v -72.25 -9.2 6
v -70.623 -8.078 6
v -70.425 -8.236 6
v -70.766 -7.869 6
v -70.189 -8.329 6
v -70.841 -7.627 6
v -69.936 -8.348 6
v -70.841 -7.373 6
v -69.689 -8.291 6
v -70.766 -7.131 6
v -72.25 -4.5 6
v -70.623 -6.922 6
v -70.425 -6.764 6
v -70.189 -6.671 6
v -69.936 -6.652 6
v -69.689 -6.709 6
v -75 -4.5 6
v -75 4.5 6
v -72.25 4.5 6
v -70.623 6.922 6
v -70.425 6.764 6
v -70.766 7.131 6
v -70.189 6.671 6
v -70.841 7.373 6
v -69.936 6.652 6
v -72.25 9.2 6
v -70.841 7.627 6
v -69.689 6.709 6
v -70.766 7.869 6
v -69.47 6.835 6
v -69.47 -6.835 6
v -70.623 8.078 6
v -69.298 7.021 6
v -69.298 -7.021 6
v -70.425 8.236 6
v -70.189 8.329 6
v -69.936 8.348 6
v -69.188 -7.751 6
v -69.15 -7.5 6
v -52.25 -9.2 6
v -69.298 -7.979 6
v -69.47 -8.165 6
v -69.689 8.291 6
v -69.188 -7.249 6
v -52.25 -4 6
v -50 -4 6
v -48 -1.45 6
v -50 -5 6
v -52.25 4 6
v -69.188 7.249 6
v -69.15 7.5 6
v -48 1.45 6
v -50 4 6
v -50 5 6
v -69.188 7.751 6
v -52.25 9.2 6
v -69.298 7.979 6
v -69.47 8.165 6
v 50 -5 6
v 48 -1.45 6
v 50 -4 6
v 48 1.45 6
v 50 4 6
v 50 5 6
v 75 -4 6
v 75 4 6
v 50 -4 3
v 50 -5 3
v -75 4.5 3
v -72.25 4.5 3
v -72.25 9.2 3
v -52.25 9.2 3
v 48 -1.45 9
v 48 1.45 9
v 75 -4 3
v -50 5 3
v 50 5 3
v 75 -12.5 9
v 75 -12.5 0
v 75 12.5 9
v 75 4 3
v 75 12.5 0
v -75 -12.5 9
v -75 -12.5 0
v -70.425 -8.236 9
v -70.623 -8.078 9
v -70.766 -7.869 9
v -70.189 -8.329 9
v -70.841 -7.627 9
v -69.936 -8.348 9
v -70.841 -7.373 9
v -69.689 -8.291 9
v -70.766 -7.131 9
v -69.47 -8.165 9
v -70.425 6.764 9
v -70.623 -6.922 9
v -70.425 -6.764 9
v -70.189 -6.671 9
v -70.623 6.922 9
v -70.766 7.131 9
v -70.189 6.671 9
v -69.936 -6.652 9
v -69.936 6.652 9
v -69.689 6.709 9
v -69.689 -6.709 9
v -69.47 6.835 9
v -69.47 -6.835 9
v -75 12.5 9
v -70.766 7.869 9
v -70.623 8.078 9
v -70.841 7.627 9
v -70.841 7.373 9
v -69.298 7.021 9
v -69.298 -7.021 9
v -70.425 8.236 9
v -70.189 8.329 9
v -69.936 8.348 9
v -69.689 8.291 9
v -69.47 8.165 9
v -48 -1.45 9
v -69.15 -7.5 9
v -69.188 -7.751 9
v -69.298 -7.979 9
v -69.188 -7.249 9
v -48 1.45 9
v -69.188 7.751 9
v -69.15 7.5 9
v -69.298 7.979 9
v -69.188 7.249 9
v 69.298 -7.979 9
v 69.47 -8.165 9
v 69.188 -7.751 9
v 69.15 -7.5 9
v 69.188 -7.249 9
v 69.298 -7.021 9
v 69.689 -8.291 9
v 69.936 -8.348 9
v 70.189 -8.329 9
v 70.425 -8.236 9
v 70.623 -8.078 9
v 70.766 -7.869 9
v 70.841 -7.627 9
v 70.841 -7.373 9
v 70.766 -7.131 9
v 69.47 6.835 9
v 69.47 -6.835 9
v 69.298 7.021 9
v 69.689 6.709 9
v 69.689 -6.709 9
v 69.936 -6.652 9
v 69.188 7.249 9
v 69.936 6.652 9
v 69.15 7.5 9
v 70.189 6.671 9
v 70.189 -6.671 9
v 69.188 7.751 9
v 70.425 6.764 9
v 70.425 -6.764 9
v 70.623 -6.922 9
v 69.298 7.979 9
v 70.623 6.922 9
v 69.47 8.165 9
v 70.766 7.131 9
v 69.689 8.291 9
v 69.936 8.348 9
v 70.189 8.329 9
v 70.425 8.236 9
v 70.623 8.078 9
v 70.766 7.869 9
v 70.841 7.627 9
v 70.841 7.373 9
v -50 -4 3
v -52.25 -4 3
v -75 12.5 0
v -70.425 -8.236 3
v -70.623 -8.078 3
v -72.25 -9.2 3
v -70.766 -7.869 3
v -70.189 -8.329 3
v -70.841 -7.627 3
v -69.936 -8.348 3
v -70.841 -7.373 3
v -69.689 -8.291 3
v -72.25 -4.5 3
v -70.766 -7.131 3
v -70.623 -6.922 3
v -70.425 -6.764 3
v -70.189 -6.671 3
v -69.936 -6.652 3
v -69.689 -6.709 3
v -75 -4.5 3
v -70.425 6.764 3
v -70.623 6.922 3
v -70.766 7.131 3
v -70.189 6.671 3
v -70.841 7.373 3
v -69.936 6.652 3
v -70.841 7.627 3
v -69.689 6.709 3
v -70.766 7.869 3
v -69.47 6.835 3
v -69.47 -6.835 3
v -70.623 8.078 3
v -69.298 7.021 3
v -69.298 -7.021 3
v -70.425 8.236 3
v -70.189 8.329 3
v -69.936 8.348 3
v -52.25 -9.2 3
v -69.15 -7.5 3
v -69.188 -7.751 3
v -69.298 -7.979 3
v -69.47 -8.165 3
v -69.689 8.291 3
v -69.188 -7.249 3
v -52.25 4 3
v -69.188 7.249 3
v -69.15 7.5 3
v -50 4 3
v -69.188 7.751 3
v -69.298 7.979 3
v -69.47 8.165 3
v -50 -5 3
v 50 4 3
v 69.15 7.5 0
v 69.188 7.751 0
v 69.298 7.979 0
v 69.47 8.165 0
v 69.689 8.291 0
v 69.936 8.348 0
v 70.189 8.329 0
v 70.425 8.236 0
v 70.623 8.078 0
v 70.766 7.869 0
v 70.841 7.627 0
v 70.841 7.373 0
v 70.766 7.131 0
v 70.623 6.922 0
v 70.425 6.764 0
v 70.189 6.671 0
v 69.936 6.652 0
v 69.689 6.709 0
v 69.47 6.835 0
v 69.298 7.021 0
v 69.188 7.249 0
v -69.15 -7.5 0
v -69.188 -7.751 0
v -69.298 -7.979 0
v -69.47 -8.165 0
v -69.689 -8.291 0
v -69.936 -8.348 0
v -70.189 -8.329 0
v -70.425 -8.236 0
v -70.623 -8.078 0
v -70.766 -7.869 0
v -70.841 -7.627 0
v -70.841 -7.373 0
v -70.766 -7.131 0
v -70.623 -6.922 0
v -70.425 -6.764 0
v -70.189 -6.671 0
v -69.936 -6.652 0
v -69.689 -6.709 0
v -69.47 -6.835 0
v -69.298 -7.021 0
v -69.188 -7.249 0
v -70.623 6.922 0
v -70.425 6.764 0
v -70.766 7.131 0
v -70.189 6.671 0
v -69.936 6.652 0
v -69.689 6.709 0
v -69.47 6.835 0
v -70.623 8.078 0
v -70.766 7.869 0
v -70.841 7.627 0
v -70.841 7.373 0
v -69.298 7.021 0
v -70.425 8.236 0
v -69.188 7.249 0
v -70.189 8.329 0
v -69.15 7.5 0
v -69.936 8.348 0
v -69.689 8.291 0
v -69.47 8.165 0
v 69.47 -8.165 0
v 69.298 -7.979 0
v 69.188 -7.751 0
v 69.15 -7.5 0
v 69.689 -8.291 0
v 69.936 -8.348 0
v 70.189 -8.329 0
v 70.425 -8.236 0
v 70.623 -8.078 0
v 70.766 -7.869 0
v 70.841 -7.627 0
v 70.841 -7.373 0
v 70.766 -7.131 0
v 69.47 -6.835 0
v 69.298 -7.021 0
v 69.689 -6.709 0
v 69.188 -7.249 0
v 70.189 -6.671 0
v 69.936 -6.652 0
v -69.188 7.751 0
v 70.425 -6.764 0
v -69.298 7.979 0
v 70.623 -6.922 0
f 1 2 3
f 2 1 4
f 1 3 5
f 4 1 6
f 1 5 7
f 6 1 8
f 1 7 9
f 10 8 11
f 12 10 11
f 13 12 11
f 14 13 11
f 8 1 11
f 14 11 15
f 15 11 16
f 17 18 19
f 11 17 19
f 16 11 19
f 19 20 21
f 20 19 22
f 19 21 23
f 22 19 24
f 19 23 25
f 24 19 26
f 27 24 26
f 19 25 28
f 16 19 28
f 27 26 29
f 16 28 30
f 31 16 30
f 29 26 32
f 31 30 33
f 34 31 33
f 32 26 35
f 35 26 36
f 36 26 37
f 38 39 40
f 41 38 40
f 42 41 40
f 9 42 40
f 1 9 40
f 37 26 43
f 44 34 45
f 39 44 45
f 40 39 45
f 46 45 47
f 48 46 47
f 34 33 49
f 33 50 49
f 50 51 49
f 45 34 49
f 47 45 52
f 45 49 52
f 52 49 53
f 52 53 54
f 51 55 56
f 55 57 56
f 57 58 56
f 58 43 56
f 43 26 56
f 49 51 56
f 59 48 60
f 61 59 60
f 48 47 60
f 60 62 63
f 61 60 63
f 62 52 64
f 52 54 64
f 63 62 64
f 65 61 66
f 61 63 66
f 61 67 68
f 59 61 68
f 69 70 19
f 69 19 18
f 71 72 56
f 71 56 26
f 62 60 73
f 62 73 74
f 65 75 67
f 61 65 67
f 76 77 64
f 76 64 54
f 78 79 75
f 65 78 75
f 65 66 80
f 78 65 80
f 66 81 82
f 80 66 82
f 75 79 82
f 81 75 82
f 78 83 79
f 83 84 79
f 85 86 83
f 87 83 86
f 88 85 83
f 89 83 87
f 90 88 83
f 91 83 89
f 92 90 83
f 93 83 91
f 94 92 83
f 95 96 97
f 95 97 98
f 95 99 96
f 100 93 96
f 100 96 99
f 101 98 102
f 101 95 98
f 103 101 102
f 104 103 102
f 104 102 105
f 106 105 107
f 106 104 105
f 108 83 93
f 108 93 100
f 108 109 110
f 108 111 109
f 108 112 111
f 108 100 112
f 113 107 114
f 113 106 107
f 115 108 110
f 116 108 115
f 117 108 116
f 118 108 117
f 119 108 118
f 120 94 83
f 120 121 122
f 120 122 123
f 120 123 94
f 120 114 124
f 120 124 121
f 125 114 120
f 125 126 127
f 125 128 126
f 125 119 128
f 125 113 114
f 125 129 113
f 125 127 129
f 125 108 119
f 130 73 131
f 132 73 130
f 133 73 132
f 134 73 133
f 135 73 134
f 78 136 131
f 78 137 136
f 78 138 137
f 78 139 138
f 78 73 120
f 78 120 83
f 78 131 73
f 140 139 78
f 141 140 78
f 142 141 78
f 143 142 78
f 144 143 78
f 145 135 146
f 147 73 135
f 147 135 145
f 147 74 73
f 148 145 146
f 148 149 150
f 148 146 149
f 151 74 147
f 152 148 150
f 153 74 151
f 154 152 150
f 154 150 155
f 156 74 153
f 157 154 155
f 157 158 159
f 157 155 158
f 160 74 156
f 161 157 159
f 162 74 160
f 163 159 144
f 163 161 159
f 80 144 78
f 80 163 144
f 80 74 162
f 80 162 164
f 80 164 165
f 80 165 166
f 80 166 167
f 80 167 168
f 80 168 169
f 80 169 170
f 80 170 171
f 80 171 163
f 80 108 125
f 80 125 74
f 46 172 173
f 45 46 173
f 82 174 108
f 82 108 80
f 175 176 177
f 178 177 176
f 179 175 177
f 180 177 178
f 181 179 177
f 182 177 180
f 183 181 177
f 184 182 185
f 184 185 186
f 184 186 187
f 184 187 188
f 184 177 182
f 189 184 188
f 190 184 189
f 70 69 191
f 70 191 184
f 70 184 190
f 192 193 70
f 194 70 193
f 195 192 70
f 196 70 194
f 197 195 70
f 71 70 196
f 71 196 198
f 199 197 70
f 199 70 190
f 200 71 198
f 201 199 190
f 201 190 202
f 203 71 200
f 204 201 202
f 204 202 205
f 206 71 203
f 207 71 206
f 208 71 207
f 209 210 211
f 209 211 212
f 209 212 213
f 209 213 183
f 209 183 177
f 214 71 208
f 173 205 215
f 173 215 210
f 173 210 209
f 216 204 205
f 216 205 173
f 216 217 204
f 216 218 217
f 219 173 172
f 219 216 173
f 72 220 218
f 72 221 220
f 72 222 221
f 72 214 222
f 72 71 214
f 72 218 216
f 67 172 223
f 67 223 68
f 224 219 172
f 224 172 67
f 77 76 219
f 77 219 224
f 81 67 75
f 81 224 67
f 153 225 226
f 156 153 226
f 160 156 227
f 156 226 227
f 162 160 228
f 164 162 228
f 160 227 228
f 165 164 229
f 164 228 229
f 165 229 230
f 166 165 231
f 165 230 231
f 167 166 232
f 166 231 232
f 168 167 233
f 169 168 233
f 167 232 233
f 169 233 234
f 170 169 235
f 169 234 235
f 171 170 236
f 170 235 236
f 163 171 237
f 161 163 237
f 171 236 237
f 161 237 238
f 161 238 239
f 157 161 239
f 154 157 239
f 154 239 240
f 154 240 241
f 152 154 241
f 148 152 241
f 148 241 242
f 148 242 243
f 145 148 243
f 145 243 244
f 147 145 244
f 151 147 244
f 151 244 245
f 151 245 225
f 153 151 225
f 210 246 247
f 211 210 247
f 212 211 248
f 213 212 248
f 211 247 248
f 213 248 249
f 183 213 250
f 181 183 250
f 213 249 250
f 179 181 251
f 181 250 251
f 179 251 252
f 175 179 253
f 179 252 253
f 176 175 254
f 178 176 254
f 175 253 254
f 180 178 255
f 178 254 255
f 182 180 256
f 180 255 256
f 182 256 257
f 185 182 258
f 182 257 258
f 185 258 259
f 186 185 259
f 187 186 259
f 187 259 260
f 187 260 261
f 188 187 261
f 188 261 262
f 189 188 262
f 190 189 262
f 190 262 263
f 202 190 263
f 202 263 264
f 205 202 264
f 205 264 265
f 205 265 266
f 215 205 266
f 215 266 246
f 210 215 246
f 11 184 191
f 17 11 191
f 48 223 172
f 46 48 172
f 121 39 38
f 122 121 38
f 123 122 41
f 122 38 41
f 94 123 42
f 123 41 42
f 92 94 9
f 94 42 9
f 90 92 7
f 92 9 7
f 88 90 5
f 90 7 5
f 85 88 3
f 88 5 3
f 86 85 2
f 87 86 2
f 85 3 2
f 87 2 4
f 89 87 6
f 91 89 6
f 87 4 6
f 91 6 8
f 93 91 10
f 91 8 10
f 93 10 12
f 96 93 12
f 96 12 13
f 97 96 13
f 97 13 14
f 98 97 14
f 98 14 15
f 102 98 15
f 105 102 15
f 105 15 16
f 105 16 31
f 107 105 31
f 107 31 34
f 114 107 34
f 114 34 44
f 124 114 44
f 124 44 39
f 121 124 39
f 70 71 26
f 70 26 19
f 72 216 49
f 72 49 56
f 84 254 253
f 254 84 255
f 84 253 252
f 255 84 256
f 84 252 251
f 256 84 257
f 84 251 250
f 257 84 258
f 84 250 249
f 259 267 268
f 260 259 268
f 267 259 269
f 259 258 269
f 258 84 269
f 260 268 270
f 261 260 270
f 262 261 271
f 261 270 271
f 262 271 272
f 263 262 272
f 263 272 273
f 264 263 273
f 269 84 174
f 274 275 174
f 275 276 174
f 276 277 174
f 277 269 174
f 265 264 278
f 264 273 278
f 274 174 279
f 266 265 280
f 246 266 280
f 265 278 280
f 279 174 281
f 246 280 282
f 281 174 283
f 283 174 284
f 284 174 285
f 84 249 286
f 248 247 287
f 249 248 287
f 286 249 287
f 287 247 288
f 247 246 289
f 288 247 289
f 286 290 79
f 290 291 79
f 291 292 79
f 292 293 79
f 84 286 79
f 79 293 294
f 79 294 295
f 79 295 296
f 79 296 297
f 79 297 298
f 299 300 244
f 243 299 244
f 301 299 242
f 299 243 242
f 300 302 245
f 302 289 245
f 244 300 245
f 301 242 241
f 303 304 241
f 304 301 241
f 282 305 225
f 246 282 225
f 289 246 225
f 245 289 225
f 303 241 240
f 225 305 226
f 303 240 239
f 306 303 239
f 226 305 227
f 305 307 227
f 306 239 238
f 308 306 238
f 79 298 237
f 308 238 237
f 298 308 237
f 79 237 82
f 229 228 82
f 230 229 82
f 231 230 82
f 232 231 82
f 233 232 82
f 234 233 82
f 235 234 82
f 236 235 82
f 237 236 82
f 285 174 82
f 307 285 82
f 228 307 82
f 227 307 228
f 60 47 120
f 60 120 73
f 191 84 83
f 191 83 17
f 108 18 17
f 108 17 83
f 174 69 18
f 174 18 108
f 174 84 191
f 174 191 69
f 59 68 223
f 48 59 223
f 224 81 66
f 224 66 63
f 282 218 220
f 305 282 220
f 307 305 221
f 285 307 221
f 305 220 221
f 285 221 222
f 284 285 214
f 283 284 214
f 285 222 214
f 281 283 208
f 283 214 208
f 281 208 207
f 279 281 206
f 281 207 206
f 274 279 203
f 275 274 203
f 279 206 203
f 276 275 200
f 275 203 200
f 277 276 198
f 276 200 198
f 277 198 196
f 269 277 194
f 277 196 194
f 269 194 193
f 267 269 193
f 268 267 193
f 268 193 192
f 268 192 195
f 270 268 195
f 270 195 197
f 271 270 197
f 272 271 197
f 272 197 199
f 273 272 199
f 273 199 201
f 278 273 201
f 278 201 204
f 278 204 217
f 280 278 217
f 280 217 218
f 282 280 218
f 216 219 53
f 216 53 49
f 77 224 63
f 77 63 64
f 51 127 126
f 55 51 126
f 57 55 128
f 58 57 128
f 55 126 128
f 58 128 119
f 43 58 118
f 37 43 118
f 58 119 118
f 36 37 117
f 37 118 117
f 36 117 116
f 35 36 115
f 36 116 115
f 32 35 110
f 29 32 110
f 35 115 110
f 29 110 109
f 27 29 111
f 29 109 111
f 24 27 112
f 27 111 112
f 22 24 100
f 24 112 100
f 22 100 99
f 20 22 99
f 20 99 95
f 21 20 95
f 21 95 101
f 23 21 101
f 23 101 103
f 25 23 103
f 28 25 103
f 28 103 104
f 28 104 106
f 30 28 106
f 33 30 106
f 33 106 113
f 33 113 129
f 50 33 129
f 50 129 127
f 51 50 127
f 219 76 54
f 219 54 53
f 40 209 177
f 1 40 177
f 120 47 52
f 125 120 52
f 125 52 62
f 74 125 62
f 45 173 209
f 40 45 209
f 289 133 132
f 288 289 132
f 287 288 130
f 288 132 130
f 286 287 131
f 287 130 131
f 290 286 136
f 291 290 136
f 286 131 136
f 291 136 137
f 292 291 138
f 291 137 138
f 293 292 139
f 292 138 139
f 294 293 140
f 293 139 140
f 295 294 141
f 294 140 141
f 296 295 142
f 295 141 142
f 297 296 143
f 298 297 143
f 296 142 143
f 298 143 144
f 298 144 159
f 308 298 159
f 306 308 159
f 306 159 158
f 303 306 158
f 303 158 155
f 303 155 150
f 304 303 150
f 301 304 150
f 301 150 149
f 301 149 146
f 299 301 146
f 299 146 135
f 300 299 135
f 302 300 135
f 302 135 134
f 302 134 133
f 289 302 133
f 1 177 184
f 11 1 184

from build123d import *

# Parameters (mm, degrees)
SKETCH_W              = 150
SKETCH_H              = 25
PAD_DEPTH             = 3
PAD001_DEPTH          = 3
SKETCH004_W           = 150
SKETCH004_H           = 25
SKETCH004_W_2         = 96
SKETCH004_H_2         = 2.9
PAD002_DEPTH          = 3
SKETCH005_R           = 0.85
POCKET_DEPTH          = 313.671314
POLARPATTERN_COUNT    = 2
POLARPATTERN001_COUNT = 2
POLARPATTERN002_COUNT = 2


with BuildPart() as part:
    # Sketch → Pad (new body)
    with BuildSketch(Plane.XY):
        Rectangle(SKETCH_W, SKETCH_H)
    extrude(amount=PAD_DEPTH)

    # Sketch001 (on Face6 of Pad) → Pad001 (join)
    with BuildSketch(Plane.XY.offset(3)):
        Polygon((-75, 12.5), (75, 12.5), (75, 4), (50, 4), (50, 5), (-50, 5), (-50, 4), (-52.25, 4), (-52.25, 9.2), (-72.25, 9.2), (-72.25, 4.5), (-75, 4.5), align=None)
        Polygon((-75, -12.5), (75, -12.5), (75, -4), (50, -4), (50, -5), (-50, -5), (-50, -4), (-52.25, -4), (-52.25, -9.2), (-72.25, -9.2), (-72.25, -4.5), (-75, -4.5), align=None)
    extrude(amount=PAD001_DEPTH)

    # Sketch004 (on Face12 of Pad001) → Pad002 (join)
    with BuildSketch(Plane.XY.offset(6)):
        Rectangle(SKETCH004_W, SKETCH004_H)
        Rectangle(SKETCH004_W_2, SKETCH004_H_2, mode=Mode.SUBTRACT)
    extrude(amount=PAD002_DEPTH)

    # Sketch005 (on Face34 of Pad002) → Pocket (cut, through all)
    with BuildSketch(Plane.XY.offset(9)):
        with Locations((-70, 7.5)):
            Circle(SKETCH005_R)
    pocket = extrude(amount=-POCKET_DEPTH, mode=Mode.SUBTRACT)

    # PolarPattern: Pocket ×2 about axis
    polarpattern_axis = Axis((0, 0, 9), (0, 0, 1))
    for i in range(1, POLARPATTERN_COUNT):
        add(pocket.rotate(polarpattern_axis, i * 360 / POLARPATTERN_COUNT), mode=Mode.SUBTRACT)

    # PolarPattern001: Pocket ×2 about axis
    polarpattern001_axis = Axis((0, 0, 0), (0, 1, 0))
    for i in range(1, POLARPATTERN001_COUNT):
        add(pocket.rotate(polarpattern001_axis, i * 360 / POLARPATTERN001_COUNT), mode=Mode.SUBTRACT)

    # PolarPattern002: Pocket ×2 about axis
    polarpattern002_axis = Axis((0, 0, 0), (1, 0, 0))
    for i in range(1, POLARPATTERN002_COUNT):
        add(pocket.rotate(polarpattern002_axis, i * 360 / POLARPATTERN002_COUNT), mode=Mode.SUBTRACT)


solid = part.part
